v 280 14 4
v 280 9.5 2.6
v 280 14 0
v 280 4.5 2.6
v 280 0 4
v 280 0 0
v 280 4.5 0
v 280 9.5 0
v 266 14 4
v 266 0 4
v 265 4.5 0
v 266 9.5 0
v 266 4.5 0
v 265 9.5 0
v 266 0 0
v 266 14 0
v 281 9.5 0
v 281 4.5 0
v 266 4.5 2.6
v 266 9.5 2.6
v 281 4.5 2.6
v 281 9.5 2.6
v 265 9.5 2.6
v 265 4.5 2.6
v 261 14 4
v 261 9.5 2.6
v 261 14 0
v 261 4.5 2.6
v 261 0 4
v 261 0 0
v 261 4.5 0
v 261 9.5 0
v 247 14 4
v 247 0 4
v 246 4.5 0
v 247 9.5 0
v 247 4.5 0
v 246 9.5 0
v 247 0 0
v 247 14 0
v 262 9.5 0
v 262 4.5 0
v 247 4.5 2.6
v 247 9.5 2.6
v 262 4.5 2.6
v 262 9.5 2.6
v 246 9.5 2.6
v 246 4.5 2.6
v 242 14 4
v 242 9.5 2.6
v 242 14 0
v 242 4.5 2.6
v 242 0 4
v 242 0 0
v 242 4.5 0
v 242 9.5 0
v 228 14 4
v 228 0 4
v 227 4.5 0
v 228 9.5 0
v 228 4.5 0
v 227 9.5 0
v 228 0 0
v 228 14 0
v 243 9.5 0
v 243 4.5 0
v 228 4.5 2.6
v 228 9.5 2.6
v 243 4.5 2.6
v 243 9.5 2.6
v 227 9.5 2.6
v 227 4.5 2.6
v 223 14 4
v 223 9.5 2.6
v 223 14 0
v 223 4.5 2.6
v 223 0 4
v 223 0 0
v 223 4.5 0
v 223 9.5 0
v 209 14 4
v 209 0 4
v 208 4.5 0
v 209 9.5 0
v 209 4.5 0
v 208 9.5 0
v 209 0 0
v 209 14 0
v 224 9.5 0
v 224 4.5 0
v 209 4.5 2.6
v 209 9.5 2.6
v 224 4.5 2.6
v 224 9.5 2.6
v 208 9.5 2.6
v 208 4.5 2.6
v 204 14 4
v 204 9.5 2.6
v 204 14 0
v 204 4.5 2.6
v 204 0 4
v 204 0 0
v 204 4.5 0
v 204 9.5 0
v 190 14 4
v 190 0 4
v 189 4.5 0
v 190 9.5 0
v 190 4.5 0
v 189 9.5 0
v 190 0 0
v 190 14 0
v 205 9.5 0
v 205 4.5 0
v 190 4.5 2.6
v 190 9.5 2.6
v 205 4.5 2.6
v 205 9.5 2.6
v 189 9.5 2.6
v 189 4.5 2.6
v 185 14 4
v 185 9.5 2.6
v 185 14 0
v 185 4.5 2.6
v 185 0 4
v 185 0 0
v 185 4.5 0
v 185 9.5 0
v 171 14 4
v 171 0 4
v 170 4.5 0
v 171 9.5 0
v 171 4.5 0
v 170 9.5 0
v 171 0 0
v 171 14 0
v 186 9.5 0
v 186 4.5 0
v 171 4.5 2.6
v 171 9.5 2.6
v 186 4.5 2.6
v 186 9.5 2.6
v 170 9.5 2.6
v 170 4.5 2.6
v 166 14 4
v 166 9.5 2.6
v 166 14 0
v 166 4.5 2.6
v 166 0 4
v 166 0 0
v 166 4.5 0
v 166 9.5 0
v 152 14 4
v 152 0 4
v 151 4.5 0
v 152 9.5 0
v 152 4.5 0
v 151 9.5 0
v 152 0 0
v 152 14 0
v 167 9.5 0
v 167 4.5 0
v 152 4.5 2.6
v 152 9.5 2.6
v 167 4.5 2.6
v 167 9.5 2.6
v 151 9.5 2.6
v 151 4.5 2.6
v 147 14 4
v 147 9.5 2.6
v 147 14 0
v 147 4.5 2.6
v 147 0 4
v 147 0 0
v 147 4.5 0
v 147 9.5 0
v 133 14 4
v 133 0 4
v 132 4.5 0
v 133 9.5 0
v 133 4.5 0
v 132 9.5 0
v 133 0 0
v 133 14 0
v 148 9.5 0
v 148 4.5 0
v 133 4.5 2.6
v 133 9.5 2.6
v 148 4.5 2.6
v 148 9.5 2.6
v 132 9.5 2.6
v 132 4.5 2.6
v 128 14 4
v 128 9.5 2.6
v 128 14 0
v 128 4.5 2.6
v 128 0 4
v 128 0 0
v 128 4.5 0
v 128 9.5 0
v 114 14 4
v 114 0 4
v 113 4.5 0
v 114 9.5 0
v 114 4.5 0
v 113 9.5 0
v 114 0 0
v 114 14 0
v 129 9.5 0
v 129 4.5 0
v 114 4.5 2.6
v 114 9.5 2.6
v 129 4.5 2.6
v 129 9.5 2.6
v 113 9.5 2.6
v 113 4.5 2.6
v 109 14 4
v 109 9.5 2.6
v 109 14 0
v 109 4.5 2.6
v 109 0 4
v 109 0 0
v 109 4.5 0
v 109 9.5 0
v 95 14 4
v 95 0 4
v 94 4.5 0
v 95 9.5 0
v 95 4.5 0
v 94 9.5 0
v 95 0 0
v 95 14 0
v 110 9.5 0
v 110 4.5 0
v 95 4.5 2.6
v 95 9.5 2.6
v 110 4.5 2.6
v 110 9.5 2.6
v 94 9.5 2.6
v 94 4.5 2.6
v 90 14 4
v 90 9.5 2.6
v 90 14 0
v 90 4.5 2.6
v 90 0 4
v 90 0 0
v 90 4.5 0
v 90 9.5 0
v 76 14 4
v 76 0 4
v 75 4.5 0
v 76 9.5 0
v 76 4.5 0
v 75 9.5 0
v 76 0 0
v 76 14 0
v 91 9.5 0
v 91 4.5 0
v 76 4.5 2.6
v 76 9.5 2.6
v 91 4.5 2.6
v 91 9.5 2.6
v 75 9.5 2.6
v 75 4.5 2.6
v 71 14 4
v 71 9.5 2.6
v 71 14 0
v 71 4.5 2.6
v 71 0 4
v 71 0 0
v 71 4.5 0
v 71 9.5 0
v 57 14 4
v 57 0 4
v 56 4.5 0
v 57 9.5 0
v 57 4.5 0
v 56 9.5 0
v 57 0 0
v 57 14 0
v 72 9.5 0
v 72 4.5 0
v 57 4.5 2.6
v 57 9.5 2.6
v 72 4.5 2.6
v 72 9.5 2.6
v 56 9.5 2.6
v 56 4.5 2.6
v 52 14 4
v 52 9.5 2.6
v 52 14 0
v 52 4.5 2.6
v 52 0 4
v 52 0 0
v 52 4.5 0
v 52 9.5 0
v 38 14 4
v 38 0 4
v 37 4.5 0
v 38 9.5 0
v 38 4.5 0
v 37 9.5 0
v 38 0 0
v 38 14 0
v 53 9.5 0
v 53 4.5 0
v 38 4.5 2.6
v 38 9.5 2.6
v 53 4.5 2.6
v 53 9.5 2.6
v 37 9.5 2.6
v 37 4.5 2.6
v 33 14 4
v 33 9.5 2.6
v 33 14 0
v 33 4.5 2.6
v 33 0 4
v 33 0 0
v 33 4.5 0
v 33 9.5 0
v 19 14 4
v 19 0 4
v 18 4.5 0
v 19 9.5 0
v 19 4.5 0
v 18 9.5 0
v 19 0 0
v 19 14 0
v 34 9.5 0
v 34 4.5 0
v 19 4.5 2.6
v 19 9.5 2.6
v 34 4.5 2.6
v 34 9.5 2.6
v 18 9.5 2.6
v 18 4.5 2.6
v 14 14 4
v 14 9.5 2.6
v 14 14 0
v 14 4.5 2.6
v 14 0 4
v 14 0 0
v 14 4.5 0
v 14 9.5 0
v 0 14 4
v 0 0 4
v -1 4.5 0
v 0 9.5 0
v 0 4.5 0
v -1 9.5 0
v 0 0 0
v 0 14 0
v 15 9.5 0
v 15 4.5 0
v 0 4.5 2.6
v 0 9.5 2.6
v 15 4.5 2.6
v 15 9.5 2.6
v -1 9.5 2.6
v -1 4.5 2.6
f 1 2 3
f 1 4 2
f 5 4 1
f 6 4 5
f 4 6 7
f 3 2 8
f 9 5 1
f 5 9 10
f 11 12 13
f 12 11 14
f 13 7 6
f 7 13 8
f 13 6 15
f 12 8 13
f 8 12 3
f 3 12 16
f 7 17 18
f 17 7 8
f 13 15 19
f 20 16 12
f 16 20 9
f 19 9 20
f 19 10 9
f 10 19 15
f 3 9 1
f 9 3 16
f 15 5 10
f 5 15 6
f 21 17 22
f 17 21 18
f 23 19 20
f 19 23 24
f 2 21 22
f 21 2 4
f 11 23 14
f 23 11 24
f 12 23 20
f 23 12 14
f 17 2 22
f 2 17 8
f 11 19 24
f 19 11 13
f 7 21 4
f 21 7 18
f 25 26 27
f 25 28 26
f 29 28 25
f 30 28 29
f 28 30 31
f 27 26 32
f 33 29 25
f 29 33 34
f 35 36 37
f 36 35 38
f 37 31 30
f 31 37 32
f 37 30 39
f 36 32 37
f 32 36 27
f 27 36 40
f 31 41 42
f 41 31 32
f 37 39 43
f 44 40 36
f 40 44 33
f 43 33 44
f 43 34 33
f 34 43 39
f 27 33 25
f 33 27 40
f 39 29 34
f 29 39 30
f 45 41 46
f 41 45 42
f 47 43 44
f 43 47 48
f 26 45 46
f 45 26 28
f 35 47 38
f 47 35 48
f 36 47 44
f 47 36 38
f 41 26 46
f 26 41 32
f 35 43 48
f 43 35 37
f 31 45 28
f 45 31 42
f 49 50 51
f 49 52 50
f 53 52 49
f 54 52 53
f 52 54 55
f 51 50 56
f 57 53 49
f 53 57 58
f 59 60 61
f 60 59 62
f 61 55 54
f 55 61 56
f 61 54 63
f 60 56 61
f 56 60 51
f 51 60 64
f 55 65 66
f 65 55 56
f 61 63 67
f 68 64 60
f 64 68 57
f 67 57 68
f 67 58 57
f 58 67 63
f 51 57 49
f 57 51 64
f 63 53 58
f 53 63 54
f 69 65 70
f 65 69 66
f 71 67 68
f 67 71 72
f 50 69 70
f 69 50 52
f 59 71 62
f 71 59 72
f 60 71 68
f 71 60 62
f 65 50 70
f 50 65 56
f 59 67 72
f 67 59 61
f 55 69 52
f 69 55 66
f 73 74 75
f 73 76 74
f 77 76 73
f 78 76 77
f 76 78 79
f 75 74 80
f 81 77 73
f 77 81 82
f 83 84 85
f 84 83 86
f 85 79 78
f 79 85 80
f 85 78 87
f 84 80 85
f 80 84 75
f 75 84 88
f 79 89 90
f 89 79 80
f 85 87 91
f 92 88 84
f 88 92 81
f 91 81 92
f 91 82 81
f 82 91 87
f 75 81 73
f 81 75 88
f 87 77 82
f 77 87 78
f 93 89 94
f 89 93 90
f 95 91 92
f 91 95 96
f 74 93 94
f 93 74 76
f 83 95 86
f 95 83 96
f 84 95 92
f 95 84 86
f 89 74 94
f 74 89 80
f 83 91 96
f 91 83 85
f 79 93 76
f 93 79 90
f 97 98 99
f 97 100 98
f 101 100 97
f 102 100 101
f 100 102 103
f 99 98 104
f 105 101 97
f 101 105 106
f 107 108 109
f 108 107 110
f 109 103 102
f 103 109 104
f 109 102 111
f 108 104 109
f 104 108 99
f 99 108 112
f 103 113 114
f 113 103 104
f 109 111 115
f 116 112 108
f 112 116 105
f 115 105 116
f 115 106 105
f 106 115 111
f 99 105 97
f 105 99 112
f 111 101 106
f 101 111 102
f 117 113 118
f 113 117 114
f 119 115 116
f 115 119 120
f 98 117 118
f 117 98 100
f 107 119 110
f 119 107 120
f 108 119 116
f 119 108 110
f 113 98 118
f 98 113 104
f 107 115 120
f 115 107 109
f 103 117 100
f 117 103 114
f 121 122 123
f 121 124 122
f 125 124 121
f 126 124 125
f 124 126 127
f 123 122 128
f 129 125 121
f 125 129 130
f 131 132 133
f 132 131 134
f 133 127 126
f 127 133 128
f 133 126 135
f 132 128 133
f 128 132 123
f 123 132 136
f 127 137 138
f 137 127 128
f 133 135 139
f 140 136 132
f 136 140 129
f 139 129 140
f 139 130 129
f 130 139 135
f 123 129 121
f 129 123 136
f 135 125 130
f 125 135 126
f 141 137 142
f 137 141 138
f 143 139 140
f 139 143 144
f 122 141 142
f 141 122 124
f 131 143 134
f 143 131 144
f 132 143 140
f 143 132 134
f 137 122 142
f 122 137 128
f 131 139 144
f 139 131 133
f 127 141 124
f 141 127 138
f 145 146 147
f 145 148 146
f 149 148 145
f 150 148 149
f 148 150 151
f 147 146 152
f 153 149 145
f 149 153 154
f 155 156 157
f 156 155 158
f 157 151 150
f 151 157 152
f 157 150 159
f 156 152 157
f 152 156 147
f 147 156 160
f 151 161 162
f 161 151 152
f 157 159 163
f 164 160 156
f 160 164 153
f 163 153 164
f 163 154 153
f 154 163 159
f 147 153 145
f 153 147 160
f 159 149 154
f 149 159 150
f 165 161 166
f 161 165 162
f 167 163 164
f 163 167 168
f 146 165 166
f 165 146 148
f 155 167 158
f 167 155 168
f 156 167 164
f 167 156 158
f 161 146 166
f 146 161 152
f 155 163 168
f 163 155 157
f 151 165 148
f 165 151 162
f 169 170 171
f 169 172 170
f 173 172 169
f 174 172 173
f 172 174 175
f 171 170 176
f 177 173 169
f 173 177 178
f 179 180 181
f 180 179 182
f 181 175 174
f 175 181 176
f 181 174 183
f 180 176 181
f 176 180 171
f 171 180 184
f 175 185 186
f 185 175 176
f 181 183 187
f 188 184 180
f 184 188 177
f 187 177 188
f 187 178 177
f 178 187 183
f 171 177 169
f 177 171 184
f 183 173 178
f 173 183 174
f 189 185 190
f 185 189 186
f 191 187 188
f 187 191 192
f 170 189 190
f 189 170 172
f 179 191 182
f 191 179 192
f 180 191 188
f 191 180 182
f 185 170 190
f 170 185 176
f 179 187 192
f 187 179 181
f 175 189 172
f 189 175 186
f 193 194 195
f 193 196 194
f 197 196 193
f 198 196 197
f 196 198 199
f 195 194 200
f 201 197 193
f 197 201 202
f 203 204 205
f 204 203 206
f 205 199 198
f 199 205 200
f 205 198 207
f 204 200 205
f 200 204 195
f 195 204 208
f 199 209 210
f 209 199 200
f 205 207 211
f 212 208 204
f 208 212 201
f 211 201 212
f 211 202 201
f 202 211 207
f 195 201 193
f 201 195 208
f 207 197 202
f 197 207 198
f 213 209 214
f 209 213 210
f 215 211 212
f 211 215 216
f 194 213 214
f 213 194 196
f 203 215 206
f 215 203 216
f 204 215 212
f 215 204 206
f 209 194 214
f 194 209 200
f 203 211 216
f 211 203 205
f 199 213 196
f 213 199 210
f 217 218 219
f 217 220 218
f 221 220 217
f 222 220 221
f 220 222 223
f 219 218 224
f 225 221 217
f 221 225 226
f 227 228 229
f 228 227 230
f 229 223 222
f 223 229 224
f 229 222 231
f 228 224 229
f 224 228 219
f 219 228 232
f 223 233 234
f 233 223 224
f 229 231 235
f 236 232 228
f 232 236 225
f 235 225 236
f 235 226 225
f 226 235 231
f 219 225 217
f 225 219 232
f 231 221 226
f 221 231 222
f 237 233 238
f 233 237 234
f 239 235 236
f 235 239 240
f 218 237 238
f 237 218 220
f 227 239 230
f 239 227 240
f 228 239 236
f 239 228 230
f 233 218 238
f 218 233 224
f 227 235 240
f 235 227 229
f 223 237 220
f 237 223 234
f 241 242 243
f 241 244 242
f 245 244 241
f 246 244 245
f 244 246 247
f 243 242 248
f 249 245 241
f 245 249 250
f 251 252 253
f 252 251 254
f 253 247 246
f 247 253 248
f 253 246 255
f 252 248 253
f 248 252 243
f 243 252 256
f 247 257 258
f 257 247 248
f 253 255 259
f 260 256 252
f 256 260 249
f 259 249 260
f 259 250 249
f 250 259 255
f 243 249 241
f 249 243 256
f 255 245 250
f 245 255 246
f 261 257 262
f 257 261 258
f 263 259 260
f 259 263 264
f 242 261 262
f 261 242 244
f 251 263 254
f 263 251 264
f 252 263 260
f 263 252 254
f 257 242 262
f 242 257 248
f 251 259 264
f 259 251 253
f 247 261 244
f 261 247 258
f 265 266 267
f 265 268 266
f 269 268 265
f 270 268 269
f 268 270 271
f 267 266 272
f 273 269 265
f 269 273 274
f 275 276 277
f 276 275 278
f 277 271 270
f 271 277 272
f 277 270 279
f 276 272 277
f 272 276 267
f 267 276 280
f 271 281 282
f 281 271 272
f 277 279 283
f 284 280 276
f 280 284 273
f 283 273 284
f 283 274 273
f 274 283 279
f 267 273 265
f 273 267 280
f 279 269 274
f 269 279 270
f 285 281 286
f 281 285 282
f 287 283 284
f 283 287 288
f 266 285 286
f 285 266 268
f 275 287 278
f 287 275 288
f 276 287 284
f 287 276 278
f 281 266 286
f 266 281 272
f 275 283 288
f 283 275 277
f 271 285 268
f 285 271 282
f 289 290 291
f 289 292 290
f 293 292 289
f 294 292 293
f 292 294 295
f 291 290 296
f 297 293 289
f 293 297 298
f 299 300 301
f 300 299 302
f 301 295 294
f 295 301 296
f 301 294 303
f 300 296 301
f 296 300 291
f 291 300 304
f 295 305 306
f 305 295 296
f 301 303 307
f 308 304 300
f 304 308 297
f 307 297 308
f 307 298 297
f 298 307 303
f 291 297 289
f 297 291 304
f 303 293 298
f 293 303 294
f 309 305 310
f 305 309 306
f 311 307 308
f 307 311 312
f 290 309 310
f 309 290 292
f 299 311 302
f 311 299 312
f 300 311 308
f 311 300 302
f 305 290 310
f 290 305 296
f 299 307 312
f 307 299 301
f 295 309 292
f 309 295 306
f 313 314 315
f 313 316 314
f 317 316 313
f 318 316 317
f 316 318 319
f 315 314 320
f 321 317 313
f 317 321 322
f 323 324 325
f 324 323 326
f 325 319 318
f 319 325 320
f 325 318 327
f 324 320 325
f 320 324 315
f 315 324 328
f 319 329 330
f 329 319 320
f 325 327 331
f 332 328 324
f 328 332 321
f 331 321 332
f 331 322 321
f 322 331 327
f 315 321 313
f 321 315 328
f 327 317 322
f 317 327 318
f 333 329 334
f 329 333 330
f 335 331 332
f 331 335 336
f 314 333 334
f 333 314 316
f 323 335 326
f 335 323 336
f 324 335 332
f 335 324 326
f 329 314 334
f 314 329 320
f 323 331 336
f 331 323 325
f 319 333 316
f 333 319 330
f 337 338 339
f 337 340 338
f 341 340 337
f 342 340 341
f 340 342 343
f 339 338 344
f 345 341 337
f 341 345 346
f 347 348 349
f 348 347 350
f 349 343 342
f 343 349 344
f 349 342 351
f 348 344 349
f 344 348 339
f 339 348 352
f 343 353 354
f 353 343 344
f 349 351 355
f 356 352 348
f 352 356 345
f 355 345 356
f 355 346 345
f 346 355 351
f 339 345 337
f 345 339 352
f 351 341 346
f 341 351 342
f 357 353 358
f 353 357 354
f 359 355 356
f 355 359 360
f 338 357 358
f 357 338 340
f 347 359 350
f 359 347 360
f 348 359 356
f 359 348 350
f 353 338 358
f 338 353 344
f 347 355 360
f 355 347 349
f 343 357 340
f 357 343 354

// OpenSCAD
$fn=100;
union()
{
	translate([266,0,0])
	{
		union()
		{
			cube([14,14,4]);
			translate([-1,4.5,0])
			{
				cube([16,5,2.6]);
			}
		}
	}
	translate([247,0,0])
	{
		union()
		{
			cube([14,14,4]);
			translate([-1,4.5,0])
			{
				cube([16,5,2.6]);
			}
		}
	}
	translate([228,0,0])
	{
		union()
		{
			cube([14,14,4]);
			translate([-1,4.5,0])
			{
				cube([16,5,2.6]);
			}
		}
	}
	translate([209,0,0])
	{
		union()
		{
			cube([14,14,4]);
			translate([-1,4.5,0])
			{
				cube([16,5,2.6]);
			}
		}
	}
	translate([190,0,0])
	{
		union()
		{
			cube([14,14,4]);
			translate([-1,4.5,0])
			{
				cube([16,5,2.6]);
			}
		}
	}
	translate([171,0,0])
	{
		union()
		{
			cube([14,14,4]);
			translate([-1,4.5,0])
			{
				cube([16,5,2.6]);
			}
		}
	}
	translate([152,0,0])
	{
		union()
		{
			cube([14,14,4]);
			translate([-1,4.5,0])
			{
				cube([16,5,2.6]);
			}
		}
	}
	translate([133,0,0])
	{
		union()
		{
			cube([14,14,4]);
			translate([-1,4.5,0])
			{
				cube([16,5,2.6]);
			}
		}
	}
	translate([114,0,0])
	{
		union()
		{
			cube([14,14,4]);
			translate([-1,4.5,0])
			{
				cube([16,5,2.6]);
			}
		}
	}
	translate([95,0,0])
	{
		union()
		{
			cube([14,14,4]);
			translate([-1,4.5,0])
			{
				cube([16,5,2.6]);
			}
		}
	}
	translate([76,0,0])
	{
		union()
		{
			cube([14,14,4]);
			translate([-1,4.5,0])
			{
				cube([16,5,2.6]);
			}
		}
	}
	translate([57,0,0])
	{
		union()
		{
			cube([14,14,4]);
			translate([-1,4.5,0])
			{
				cube([16,5,2.6]);
			}
		}
	}
	translate([38,0,0])
	{
		union()
		{
			cube([14,14,4]);
			translate([-1,4.5,0])
			{
				cube([16,5,2.6]);
			}
		}
	}
	translate([19,0,0])
	{
		union()
		{
			cube([14,14,4]);
			translate([-1,4.5,0])
			{
				cube([16,5,2.6]);
			}
		}
	}
	translate([0,0,0])
	{
		union()
		{
			cube([14,14,4]);
			translate([-1,4.5,0])
			{
				cube([16,5,2.6]);
			}
		}
	}
}
